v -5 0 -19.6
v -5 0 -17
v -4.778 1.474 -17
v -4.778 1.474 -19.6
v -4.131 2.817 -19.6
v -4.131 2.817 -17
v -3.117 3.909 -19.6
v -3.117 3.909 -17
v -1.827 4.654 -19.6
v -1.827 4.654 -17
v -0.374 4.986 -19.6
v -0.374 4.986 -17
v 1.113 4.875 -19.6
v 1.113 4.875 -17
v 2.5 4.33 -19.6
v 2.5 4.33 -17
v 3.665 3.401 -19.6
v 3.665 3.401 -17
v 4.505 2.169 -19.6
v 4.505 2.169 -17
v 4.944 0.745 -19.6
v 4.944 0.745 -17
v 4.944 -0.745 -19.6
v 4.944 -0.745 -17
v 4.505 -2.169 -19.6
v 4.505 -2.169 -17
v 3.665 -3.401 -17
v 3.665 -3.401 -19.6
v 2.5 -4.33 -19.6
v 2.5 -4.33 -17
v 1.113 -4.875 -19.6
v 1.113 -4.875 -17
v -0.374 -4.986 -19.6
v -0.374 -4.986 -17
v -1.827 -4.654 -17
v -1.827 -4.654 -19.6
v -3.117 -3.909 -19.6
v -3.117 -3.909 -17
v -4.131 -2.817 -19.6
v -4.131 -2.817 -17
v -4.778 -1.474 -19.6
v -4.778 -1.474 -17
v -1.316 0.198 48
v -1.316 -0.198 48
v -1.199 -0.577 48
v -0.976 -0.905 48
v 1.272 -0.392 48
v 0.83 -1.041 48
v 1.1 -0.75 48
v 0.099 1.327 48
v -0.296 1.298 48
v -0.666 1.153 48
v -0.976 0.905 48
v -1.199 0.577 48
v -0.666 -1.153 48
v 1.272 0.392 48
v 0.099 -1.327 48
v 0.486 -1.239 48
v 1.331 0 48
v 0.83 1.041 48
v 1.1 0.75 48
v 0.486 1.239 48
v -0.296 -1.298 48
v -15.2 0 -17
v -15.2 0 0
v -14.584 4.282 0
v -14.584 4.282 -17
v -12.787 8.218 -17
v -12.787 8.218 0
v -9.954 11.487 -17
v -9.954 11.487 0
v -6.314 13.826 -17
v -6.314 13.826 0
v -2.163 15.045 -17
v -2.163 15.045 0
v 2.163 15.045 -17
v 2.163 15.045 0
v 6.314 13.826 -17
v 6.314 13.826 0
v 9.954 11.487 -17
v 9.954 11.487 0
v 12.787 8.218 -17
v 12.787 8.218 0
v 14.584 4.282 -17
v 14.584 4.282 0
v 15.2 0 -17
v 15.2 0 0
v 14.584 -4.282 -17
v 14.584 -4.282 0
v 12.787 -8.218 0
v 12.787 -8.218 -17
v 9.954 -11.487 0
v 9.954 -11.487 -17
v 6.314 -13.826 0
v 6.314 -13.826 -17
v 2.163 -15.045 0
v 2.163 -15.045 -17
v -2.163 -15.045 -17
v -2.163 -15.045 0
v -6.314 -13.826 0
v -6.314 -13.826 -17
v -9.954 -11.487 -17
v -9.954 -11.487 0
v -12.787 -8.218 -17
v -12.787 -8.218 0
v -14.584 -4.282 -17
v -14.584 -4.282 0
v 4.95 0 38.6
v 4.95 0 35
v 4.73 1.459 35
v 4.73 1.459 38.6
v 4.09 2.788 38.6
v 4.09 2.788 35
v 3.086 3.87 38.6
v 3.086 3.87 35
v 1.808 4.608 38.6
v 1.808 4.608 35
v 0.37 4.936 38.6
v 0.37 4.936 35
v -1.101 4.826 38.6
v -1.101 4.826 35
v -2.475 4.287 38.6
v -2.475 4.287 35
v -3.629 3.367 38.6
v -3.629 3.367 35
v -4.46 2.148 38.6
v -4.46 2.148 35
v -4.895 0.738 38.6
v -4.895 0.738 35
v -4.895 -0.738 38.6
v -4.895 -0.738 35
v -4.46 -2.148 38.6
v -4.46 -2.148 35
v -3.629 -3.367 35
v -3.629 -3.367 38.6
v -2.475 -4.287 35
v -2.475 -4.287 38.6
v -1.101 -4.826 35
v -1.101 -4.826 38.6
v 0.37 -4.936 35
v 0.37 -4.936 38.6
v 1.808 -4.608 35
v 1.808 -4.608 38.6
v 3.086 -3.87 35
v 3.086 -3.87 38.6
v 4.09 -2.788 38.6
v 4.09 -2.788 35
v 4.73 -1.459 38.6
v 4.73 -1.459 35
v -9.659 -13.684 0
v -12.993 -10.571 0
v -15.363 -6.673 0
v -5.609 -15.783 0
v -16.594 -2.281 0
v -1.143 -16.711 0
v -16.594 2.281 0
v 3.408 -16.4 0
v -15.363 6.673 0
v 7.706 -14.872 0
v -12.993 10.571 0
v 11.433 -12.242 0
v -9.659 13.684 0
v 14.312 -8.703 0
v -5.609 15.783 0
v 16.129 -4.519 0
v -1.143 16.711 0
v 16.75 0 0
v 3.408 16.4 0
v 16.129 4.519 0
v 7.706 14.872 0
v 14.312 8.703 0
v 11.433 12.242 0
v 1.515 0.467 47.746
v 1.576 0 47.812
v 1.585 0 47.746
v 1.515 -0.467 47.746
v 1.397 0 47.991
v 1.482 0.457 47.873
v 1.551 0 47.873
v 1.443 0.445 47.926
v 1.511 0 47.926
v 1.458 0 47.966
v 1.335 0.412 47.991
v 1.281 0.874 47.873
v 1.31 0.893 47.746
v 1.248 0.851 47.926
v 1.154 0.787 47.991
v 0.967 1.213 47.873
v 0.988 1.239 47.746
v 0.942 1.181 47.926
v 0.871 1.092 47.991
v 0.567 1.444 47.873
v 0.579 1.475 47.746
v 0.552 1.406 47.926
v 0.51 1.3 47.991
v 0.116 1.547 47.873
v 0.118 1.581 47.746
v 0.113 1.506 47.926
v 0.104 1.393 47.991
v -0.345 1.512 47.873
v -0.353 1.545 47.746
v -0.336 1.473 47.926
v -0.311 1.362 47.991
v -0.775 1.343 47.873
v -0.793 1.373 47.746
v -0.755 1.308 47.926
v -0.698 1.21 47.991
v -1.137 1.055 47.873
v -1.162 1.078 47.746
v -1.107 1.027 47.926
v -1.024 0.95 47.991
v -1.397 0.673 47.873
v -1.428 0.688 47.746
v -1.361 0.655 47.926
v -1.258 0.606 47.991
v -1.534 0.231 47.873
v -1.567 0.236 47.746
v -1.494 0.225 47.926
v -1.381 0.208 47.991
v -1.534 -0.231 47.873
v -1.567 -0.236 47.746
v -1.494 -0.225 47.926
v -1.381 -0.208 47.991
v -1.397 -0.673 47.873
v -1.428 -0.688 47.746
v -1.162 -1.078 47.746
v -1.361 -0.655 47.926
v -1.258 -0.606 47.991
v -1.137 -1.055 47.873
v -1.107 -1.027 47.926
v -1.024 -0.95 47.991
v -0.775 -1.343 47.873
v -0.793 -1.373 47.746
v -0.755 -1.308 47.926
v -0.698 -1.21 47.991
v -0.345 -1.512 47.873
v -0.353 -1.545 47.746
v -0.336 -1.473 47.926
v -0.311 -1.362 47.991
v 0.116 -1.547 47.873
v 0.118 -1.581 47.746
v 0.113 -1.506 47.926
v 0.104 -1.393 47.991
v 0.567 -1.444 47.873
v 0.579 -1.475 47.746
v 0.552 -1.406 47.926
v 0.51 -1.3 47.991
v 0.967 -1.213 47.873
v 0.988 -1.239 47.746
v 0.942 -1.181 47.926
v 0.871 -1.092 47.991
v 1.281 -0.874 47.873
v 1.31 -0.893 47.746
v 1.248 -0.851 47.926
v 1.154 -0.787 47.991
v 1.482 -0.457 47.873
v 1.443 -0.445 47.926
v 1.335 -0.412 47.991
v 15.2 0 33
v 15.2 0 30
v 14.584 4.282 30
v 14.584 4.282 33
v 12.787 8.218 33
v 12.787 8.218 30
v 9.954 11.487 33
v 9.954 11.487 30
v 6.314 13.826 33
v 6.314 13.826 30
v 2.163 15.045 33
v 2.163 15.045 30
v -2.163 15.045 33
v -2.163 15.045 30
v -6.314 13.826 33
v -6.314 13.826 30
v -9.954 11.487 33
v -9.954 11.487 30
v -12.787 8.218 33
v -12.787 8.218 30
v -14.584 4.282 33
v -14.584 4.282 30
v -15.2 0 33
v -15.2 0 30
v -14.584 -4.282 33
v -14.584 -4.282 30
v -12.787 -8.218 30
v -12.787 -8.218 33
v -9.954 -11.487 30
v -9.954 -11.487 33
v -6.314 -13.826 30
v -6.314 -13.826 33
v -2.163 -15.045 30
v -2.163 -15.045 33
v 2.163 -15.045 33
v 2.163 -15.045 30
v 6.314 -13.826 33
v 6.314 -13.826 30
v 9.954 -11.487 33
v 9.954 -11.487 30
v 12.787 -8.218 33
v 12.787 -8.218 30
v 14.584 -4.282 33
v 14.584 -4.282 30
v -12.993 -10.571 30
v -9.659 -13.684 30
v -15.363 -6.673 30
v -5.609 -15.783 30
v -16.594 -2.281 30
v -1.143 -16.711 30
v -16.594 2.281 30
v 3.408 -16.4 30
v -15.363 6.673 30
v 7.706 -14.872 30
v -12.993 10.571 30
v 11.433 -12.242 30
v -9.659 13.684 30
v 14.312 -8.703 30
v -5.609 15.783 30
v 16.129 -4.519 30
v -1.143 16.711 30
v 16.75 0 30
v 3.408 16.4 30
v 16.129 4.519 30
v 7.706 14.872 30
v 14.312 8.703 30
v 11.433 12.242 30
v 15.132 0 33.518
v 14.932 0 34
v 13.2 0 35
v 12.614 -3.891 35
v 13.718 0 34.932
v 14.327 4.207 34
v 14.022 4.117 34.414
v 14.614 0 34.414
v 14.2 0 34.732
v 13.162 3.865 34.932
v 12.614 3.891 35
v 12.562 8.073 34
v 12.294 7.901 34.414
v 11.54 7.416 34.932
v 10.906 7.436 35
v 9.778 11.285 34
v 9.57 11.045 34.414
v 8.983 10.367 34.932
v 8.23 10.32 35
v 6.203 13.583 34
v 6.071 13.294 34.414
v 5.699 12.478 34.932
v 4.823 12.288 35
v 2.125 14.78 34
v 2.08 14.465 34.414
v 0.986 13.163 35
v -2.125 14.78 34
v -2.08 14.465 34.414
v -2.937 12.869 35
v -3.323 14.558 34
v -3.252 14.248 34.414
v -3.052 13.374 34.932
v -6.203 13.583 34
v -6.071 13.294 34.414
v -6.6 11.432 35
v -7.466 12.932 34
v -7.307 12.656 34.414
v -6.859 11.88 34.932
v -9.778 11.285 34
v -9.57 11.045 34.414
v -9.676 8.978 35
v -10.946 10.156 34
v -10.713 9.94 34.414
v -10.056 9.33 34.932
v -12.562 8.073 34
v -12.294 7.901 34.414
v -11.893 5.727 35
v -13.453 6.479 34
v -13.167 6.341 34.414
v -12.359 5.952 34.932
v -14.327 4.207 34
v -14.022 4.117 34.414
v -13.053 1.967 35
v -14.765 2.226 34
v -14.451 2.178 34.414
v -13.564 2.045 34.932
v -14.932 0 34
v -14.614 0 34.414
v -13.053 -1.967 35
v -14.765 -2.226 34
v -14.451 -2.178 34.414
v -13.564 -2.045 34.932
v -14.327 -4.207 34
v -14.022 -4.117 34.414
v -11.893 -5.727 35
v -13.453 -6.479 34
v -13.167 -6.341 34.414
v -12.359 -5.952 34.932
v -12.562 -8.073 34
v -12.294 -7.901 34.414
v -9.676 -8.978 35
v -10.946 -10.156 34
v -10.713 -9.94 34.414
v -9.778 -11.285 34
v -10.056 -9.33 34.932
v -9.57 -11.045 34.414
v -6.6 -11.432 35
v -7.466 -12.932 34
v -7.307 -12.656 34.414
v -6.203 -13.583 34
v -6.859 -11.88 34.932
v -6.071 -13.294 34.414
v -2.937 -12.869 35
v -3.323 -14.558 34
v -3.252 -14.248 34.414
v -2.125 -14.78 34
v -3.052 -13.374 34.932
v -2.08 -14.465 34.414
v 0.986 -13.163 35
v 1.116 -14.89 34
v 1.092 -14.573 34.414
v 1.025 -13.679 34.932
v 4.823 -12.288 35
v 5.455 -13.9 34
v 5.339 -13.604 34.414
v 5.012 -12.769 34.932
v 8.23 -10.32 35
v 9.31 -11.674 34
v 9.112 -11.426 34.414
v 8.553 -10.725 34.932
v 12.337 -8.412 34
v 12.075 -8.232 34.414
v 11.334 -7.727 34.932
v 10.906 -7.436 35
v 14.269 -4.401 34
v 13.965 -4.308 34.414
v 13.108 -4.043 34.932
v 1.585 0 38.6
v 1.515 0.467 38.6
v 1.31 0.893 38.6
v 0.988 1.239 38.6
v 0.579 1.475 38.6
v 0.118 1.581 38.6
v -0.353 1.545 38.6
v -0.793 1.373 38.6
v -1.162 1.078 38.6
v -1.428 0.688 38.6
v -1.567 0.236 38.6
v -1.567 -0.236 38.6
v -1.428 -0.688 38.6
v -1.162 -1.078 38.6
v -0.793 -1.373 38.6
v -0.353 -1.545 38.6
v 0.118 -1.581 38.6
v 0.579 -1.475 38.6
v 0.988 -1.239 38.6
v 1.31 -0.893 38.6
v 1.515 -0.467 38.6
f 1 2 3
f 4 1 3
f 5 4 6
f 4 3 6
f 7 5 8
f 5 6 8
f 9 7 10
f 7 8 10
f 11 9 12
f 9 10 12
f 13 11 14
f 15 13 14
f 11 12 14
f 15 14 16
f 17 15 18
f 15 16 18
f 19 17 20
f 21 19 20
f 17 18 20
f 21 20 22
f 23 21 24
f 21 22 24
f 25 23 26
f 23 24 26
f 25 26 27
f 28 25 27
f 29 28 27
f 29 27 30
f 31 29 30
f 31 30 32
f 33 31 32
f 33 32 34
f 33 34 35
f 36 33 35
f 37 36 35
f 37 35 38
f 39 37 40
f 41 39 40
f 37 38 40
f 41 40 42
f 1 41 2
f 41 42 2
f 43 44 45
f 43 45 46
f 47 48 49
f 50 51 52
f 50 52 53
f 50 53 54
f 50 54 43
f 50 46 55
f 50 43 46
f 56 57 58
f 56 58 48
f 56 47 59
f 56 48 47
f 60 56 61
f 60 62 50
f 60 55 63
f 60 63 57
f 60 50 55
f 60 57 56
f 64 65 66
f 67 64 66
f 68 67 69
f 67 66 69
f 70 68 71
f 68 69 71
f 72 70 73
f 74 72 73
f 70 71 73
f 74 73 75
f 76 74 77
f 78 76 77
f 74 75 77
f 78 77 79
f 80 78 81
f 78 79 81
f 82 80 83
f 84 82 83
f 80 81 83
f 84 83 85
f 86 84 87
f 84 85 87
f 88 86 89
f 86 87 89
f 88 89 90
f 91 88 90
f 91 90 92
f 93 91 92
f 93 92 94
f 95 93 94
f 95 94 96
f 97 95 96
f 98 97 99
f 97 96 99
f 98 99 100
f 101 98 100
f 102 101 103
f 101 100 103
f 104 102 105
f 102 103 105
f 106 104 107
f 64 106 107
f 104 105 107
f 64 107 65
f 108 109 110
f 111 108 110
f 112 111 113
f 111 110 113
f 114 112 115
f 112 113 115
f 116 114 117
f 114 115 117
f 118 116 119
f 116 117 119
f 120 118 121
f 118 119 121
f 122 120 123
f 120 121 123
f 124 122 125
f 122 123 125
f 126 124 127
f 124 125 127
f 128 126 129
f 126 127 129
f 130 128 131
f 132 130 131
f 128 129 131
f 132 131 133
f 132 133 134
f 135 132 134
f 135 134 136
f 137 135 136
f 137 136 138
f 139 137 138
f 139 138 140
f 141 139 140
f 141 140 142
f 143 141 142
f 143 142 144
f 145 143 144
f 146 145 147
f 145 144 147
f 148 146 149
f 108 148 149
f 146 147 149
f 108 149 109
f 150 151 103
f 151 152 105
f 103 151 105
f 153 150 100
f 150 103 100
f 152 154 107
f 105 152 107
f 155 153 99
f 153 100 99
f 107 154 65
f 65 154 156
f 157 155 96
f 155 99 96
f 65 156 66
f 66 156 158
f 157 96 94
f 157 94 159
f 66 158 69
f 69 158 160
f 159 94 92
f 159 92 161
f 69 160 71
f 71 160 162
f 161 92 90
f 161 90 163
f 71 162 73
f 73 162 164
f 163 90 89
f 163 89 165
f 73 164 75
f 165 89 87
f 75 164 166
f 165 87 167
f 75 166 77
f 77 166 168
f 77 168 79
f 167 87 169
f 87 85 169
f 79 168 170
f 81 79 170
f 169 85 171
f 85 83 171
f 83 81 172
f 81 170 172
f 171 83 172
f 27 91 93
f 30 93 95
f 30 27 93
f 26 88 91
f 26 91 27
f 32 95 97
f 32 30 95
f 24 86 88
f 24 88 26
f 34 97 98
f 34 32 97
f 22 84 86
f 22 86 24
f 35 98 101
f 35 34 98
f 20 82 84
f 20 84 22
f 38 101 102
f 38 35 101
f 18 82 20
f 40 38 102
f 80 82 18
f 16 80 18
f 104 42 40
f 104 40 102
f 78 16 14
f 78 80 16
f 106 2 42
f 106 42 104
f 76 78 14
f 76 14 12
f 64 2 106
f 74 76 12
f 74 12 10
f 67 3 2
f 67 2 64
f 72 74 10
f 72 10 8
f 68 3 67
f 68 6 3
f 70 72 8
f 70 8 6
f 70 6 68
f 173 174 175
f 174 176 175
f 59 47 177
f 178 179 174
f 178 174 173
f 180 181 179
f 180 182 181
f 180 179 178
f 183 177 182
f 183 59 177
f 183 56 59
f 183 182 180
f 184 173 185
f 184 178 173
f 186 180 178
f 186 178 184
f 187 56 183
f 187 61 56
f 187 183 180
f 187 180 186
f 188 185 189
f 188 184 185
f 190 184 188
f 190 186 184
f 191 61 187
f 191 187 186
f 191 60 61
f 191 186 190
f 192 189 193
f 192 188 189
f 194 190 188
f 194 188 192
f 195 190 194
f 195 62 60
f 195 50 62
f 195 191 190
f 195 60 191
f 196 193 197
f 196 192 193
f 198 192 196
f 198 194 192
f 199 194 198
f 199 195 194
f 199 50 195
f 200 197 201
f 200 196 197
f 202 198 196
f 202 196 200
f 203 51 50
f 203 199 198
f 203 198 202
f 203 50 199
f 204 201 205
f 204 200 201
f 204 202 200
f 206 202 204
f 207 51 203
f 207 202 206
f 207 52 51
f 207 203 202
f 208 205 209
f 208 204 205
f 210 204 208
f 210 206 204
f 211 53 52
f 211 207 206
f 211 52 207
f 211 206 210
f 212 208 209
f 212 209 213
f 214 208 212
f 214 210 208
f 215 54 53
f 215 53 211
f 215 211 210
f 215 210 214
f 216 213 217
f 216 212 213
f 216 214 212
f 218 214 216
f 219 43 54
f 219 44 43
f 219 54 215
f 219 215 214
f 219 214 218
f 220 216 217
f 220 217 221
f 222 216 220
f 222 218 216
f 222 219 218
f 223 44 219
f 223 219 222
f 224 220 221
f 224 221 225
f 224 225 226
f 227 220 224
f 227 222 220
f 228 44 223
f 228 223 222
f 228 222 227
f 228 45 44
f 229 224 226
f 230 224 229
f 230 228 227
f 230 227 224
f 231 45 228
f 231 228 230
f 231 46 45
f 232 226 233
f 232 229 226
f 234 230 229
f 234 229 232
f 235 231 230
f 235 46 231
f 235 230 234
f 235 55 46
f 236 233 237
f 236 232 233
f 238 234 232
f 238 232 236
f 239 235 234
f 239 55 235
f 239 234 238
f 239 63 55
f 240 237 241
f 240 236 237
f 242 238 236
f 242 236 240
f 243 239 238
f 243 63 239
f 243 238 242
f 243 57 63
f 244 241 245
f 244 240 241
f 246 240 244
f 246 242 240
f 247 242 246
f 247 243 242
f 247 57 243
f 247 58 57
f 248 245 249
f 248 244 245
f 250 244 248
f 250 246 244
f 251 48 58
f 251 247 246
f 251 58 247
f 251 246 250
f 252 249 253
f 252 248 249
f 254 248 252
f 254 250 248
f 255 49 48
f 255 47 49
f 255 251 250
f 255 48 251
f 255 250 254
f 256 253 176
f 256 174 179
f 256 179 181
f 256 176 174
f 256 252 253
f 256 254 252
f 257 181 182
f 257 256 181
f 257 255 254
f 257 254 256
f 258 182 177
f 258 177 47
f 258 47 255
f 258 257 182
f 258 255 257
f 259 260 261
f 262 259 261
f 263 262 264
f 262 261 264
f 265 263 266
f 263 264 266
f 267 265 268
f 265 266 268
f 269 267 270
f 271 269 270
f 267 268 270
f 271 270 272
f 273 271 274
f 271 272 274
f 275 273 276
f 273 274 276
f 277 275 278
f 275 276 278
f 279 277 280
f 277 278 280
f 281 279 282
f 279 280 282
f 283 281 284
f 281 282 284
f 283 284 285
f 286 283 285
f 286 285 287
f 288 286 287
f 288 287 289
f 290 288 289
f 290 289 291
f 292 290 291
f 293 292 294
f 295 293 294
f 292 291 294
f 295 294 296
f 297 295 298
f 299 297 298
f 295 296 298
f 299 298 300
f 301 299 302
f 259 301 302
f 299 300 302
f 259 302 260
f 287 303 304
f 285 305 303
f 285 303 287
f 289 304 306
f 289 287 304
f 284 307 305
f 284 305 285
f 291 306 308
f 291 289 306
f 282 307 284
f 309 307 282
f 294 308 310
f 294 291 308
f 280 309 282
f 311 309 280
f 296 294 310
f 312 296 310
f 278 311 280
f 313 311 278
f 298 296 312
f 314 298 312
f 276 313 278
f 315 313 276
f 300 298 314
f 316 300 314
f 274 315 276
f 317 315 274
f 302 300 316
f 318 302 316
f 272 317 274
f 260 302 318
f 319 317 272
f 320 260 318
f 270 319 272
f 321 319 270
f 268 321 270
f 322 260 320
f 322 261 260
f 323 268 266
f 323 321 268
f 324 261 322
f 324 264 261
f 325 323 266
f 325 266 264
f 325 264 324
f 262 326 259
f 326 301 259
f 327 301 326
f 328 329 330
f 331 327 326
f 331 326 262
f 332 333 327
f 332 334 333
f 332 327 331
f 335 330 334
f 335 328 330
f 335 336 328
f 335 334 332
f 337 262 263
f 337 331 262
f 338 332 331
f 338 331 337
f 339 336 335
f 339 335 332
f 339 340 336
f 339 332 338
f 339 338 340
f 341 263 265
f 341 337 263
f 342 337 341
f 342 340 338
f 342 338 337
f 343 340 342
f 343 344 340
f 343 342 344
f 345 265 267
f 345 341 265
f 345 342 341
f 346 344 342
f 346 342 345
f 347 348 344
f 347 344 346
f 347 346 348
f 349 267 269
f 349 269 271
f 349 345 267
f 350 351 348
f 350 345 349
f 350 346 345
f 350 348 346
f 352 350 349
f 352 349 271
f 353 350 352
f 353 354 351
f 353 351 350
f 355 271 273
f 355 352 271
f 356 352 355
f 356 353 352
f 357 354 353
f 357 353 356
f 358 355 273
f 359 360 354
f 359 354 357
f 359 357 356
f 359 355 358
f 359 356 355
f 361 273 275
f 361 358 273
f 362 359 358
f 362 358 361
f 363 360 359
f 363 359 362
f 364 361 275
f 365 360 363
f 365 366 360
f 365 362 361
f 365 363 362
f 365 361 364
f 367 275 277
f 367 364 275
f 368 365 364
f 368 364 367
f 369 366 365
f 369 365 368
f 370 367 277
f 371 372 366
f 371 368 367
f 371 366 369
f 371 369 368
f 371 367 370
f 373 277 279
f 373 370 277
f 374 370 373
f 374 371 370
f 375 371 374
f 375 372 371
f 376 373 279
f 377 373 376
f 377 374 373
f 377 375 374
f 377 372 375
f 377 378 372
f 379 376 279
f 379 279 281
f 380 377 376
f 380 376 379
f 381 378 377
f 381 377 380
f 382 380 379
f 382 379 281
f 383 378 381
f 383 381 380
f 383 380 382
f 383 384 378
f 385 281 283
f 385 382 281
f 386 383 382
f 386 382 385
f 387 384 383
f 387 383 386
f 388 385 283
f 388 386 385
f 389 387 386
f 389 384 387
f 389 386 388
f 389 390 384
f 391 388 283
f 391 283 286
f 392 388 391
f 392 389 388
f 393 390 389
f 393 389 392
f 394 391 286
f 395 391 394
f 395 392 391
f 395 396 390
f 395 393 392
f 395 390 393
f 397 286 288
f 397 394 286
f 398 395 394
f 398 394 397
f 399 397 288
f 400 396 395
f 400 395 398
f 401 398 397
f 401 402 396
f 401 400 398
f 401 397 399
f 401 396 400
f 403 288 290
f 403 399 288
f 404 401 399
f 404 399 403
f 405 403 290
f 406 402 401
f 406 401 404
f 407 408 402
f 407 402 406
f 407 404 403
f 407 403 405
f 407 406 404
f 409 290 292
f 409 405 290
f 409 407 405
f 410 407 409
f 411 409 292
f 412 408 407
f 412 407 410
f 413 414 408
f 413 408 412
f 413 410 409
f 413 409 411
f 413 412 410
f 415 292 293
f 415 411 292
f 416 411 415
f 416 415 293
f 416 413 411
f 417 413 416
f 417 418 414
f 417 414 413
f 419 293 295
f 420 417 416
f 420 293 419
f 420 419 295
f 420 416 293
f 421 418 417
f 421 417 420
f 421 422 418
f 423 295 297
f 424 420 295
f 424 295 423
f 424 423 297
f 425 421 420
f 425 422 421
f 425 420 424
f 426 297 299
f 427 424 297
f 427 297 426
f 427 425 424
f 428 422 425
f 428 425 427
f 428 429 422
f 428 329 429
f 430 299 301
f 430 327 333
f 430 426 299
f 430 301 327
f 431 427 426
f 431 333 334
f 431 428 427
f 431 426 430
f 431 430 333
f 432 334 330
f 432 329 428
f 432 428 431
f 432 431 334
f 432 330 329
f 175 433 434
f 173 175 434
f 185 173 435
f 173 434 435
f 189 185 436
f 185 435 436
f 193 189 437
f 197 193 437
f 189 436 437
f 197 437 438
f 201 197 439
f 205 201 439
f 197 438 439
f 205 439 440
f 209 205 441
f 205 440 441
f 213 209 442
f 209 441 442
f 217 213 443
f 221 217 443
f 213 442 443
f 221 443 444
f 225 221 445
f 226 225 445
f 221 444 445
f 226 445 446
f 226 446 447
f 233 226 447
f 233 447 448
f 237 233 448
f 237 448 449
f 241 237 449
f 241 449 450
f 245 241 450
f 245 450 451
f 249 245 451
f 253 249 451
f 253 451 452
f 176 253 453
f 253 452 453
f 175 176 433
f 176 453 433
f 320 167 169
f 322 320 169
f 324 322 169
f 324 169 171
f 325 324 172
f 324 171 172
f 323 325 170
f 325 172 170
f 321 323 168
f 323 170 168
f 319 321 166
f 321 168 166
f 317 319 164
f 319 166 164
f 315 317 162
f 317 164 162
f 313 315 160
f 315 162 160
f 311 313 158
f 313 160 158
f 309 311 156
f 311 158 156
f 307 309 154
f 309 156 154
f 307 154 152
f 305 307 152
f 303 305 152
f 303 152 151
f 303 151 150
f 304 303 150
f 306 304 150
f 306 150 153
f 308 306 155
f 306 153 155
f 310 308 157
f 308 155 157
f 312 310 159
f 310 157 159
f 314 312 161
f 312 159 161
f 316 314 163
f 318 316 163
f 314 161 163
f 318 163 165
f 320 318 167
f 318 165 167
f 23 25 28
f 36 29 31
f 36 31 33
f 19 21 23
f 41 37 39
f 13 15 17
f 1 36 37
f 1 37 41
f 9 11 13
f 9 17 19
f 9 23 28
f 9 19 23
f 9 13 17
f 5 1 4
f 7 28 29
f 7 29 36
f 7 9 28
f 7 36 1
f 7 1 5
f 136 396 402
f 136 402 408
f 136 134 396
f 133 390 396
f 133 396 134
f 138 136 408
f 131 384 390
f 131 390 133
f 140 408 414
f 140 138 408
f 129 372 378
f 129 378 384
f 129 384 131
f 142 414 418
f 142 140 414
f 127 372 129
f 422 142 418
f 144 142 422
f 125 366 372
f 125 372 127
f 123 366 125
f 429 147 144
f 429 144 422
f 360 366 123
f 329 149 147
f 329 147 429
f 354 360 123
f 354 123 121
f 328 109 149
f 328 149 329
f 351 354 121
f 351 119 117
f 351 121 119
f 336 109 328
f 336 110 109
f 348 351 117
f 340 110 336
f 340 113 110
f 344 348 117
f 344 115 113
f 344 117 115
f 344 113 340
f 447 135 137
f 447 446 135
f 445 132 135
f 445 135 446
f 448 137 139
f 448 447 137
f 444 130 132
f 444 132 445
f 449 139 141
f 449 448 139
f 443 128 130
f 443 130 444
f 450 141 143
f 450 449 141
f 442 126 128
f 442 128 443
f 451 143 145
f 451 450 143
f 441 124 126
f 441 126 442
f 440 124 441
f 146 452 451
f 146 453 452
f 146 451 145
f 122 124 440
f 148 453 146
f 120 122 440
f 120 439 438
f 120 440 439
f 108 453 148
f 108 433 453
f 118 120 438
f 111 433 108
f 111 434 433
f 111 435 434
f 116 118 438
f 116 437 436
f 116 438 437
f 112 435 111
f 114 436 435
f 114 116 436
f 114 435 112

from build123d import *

# Parameters (mm, degrees)
SKETCH1_R           = 16.75
BOSS_EXTRUDE1_DEPTH = 30
SKETCH2_R           = 15.2
BOSS_EXTRUDE2_DEPTH = 5
FILLET1_R           = 2
SKETCH3_R           = 15.2
BOSS_EXTRUDE3_DEPTH = 17
SKETCH4_R           = 4.95
BOSS_EXTRUDE4_DEPTH = 3.6
SKETCH5_R           = 5
BOSS_EXTRUDE5_DEPTH = 2.6
SKETCH6_R           = 1.585
BOSS_EXTRUDE6_DEPTH = 9.4
FILLET2_R           = 0.254


with BuildPart() as part:
    # Sketch1 → Boss-Extrude1 (new body)
    with BuildSketch(Plane.XY):
        Circle(SKETCH1_R)
    extrude(amount=BOSS_EXTRUDE1_DEPTH)

    # Sketch2 → Boss-Extrude2 (add)
    with BuildSketch(Plane.XY.offset(30)):
        Circle(SKETCH2_R)
    extrude(amount=BOSS_EXTRUDE2_DEPTH)

    # Fillet1
    fillet1_edges = [part.edges().sort_by_distance(p)[0] for p in [
        (-15.2, 0, 35),
    ]]
    fillet(fillet1_edges, radius=FILLET1_R)

    # Sketch3 → Boss-Extrude3 (add)
    with BuildSketch(Plane(origin=(0, 0, 0), x_dir=(-1, 0, 0), z_dir=(0, 0, -1))):
        Circle(SKETCH3_R)
    extrude(amount=BOSS_EXTRUDE3_DEPTH)

    # Sketch4 → Boss-Extrude4 (add)
    with BuildSketch(Plane.XY.offset(35)):
        Circle(SKETCH4_R)
    extrude(amount=BOSS_EXTRUDE4_DEPTH)

    # Sketch5 → Boss-Extrude5 (add)
    with BuildSketch(Plane(origin=(0, 0, -17), x_dir=(-1, 0, 0), z_dir=(0, 0, -1))):
        Circle(SKETCH5_R)
    extrude(amount=BOSS_EXTRUDE5_DEPTH)

    # Sketch6 → Boss-Extrude6 (add)
    with BuildSketch(Plane.XY.offset(38.6)):
        Circle(SKETCH6_R)
    extrude(amount=BOSS_EXTRUDE6_DEPTH)

    # Fillet2
    fillet2_edges = [part.edges().sort_by_distance(p)[0] for p in [
        (-1.585, 0, 48),
    ]]
    fillet(fillet2_edges, radius=FILLET2_R)


solid = part.part
